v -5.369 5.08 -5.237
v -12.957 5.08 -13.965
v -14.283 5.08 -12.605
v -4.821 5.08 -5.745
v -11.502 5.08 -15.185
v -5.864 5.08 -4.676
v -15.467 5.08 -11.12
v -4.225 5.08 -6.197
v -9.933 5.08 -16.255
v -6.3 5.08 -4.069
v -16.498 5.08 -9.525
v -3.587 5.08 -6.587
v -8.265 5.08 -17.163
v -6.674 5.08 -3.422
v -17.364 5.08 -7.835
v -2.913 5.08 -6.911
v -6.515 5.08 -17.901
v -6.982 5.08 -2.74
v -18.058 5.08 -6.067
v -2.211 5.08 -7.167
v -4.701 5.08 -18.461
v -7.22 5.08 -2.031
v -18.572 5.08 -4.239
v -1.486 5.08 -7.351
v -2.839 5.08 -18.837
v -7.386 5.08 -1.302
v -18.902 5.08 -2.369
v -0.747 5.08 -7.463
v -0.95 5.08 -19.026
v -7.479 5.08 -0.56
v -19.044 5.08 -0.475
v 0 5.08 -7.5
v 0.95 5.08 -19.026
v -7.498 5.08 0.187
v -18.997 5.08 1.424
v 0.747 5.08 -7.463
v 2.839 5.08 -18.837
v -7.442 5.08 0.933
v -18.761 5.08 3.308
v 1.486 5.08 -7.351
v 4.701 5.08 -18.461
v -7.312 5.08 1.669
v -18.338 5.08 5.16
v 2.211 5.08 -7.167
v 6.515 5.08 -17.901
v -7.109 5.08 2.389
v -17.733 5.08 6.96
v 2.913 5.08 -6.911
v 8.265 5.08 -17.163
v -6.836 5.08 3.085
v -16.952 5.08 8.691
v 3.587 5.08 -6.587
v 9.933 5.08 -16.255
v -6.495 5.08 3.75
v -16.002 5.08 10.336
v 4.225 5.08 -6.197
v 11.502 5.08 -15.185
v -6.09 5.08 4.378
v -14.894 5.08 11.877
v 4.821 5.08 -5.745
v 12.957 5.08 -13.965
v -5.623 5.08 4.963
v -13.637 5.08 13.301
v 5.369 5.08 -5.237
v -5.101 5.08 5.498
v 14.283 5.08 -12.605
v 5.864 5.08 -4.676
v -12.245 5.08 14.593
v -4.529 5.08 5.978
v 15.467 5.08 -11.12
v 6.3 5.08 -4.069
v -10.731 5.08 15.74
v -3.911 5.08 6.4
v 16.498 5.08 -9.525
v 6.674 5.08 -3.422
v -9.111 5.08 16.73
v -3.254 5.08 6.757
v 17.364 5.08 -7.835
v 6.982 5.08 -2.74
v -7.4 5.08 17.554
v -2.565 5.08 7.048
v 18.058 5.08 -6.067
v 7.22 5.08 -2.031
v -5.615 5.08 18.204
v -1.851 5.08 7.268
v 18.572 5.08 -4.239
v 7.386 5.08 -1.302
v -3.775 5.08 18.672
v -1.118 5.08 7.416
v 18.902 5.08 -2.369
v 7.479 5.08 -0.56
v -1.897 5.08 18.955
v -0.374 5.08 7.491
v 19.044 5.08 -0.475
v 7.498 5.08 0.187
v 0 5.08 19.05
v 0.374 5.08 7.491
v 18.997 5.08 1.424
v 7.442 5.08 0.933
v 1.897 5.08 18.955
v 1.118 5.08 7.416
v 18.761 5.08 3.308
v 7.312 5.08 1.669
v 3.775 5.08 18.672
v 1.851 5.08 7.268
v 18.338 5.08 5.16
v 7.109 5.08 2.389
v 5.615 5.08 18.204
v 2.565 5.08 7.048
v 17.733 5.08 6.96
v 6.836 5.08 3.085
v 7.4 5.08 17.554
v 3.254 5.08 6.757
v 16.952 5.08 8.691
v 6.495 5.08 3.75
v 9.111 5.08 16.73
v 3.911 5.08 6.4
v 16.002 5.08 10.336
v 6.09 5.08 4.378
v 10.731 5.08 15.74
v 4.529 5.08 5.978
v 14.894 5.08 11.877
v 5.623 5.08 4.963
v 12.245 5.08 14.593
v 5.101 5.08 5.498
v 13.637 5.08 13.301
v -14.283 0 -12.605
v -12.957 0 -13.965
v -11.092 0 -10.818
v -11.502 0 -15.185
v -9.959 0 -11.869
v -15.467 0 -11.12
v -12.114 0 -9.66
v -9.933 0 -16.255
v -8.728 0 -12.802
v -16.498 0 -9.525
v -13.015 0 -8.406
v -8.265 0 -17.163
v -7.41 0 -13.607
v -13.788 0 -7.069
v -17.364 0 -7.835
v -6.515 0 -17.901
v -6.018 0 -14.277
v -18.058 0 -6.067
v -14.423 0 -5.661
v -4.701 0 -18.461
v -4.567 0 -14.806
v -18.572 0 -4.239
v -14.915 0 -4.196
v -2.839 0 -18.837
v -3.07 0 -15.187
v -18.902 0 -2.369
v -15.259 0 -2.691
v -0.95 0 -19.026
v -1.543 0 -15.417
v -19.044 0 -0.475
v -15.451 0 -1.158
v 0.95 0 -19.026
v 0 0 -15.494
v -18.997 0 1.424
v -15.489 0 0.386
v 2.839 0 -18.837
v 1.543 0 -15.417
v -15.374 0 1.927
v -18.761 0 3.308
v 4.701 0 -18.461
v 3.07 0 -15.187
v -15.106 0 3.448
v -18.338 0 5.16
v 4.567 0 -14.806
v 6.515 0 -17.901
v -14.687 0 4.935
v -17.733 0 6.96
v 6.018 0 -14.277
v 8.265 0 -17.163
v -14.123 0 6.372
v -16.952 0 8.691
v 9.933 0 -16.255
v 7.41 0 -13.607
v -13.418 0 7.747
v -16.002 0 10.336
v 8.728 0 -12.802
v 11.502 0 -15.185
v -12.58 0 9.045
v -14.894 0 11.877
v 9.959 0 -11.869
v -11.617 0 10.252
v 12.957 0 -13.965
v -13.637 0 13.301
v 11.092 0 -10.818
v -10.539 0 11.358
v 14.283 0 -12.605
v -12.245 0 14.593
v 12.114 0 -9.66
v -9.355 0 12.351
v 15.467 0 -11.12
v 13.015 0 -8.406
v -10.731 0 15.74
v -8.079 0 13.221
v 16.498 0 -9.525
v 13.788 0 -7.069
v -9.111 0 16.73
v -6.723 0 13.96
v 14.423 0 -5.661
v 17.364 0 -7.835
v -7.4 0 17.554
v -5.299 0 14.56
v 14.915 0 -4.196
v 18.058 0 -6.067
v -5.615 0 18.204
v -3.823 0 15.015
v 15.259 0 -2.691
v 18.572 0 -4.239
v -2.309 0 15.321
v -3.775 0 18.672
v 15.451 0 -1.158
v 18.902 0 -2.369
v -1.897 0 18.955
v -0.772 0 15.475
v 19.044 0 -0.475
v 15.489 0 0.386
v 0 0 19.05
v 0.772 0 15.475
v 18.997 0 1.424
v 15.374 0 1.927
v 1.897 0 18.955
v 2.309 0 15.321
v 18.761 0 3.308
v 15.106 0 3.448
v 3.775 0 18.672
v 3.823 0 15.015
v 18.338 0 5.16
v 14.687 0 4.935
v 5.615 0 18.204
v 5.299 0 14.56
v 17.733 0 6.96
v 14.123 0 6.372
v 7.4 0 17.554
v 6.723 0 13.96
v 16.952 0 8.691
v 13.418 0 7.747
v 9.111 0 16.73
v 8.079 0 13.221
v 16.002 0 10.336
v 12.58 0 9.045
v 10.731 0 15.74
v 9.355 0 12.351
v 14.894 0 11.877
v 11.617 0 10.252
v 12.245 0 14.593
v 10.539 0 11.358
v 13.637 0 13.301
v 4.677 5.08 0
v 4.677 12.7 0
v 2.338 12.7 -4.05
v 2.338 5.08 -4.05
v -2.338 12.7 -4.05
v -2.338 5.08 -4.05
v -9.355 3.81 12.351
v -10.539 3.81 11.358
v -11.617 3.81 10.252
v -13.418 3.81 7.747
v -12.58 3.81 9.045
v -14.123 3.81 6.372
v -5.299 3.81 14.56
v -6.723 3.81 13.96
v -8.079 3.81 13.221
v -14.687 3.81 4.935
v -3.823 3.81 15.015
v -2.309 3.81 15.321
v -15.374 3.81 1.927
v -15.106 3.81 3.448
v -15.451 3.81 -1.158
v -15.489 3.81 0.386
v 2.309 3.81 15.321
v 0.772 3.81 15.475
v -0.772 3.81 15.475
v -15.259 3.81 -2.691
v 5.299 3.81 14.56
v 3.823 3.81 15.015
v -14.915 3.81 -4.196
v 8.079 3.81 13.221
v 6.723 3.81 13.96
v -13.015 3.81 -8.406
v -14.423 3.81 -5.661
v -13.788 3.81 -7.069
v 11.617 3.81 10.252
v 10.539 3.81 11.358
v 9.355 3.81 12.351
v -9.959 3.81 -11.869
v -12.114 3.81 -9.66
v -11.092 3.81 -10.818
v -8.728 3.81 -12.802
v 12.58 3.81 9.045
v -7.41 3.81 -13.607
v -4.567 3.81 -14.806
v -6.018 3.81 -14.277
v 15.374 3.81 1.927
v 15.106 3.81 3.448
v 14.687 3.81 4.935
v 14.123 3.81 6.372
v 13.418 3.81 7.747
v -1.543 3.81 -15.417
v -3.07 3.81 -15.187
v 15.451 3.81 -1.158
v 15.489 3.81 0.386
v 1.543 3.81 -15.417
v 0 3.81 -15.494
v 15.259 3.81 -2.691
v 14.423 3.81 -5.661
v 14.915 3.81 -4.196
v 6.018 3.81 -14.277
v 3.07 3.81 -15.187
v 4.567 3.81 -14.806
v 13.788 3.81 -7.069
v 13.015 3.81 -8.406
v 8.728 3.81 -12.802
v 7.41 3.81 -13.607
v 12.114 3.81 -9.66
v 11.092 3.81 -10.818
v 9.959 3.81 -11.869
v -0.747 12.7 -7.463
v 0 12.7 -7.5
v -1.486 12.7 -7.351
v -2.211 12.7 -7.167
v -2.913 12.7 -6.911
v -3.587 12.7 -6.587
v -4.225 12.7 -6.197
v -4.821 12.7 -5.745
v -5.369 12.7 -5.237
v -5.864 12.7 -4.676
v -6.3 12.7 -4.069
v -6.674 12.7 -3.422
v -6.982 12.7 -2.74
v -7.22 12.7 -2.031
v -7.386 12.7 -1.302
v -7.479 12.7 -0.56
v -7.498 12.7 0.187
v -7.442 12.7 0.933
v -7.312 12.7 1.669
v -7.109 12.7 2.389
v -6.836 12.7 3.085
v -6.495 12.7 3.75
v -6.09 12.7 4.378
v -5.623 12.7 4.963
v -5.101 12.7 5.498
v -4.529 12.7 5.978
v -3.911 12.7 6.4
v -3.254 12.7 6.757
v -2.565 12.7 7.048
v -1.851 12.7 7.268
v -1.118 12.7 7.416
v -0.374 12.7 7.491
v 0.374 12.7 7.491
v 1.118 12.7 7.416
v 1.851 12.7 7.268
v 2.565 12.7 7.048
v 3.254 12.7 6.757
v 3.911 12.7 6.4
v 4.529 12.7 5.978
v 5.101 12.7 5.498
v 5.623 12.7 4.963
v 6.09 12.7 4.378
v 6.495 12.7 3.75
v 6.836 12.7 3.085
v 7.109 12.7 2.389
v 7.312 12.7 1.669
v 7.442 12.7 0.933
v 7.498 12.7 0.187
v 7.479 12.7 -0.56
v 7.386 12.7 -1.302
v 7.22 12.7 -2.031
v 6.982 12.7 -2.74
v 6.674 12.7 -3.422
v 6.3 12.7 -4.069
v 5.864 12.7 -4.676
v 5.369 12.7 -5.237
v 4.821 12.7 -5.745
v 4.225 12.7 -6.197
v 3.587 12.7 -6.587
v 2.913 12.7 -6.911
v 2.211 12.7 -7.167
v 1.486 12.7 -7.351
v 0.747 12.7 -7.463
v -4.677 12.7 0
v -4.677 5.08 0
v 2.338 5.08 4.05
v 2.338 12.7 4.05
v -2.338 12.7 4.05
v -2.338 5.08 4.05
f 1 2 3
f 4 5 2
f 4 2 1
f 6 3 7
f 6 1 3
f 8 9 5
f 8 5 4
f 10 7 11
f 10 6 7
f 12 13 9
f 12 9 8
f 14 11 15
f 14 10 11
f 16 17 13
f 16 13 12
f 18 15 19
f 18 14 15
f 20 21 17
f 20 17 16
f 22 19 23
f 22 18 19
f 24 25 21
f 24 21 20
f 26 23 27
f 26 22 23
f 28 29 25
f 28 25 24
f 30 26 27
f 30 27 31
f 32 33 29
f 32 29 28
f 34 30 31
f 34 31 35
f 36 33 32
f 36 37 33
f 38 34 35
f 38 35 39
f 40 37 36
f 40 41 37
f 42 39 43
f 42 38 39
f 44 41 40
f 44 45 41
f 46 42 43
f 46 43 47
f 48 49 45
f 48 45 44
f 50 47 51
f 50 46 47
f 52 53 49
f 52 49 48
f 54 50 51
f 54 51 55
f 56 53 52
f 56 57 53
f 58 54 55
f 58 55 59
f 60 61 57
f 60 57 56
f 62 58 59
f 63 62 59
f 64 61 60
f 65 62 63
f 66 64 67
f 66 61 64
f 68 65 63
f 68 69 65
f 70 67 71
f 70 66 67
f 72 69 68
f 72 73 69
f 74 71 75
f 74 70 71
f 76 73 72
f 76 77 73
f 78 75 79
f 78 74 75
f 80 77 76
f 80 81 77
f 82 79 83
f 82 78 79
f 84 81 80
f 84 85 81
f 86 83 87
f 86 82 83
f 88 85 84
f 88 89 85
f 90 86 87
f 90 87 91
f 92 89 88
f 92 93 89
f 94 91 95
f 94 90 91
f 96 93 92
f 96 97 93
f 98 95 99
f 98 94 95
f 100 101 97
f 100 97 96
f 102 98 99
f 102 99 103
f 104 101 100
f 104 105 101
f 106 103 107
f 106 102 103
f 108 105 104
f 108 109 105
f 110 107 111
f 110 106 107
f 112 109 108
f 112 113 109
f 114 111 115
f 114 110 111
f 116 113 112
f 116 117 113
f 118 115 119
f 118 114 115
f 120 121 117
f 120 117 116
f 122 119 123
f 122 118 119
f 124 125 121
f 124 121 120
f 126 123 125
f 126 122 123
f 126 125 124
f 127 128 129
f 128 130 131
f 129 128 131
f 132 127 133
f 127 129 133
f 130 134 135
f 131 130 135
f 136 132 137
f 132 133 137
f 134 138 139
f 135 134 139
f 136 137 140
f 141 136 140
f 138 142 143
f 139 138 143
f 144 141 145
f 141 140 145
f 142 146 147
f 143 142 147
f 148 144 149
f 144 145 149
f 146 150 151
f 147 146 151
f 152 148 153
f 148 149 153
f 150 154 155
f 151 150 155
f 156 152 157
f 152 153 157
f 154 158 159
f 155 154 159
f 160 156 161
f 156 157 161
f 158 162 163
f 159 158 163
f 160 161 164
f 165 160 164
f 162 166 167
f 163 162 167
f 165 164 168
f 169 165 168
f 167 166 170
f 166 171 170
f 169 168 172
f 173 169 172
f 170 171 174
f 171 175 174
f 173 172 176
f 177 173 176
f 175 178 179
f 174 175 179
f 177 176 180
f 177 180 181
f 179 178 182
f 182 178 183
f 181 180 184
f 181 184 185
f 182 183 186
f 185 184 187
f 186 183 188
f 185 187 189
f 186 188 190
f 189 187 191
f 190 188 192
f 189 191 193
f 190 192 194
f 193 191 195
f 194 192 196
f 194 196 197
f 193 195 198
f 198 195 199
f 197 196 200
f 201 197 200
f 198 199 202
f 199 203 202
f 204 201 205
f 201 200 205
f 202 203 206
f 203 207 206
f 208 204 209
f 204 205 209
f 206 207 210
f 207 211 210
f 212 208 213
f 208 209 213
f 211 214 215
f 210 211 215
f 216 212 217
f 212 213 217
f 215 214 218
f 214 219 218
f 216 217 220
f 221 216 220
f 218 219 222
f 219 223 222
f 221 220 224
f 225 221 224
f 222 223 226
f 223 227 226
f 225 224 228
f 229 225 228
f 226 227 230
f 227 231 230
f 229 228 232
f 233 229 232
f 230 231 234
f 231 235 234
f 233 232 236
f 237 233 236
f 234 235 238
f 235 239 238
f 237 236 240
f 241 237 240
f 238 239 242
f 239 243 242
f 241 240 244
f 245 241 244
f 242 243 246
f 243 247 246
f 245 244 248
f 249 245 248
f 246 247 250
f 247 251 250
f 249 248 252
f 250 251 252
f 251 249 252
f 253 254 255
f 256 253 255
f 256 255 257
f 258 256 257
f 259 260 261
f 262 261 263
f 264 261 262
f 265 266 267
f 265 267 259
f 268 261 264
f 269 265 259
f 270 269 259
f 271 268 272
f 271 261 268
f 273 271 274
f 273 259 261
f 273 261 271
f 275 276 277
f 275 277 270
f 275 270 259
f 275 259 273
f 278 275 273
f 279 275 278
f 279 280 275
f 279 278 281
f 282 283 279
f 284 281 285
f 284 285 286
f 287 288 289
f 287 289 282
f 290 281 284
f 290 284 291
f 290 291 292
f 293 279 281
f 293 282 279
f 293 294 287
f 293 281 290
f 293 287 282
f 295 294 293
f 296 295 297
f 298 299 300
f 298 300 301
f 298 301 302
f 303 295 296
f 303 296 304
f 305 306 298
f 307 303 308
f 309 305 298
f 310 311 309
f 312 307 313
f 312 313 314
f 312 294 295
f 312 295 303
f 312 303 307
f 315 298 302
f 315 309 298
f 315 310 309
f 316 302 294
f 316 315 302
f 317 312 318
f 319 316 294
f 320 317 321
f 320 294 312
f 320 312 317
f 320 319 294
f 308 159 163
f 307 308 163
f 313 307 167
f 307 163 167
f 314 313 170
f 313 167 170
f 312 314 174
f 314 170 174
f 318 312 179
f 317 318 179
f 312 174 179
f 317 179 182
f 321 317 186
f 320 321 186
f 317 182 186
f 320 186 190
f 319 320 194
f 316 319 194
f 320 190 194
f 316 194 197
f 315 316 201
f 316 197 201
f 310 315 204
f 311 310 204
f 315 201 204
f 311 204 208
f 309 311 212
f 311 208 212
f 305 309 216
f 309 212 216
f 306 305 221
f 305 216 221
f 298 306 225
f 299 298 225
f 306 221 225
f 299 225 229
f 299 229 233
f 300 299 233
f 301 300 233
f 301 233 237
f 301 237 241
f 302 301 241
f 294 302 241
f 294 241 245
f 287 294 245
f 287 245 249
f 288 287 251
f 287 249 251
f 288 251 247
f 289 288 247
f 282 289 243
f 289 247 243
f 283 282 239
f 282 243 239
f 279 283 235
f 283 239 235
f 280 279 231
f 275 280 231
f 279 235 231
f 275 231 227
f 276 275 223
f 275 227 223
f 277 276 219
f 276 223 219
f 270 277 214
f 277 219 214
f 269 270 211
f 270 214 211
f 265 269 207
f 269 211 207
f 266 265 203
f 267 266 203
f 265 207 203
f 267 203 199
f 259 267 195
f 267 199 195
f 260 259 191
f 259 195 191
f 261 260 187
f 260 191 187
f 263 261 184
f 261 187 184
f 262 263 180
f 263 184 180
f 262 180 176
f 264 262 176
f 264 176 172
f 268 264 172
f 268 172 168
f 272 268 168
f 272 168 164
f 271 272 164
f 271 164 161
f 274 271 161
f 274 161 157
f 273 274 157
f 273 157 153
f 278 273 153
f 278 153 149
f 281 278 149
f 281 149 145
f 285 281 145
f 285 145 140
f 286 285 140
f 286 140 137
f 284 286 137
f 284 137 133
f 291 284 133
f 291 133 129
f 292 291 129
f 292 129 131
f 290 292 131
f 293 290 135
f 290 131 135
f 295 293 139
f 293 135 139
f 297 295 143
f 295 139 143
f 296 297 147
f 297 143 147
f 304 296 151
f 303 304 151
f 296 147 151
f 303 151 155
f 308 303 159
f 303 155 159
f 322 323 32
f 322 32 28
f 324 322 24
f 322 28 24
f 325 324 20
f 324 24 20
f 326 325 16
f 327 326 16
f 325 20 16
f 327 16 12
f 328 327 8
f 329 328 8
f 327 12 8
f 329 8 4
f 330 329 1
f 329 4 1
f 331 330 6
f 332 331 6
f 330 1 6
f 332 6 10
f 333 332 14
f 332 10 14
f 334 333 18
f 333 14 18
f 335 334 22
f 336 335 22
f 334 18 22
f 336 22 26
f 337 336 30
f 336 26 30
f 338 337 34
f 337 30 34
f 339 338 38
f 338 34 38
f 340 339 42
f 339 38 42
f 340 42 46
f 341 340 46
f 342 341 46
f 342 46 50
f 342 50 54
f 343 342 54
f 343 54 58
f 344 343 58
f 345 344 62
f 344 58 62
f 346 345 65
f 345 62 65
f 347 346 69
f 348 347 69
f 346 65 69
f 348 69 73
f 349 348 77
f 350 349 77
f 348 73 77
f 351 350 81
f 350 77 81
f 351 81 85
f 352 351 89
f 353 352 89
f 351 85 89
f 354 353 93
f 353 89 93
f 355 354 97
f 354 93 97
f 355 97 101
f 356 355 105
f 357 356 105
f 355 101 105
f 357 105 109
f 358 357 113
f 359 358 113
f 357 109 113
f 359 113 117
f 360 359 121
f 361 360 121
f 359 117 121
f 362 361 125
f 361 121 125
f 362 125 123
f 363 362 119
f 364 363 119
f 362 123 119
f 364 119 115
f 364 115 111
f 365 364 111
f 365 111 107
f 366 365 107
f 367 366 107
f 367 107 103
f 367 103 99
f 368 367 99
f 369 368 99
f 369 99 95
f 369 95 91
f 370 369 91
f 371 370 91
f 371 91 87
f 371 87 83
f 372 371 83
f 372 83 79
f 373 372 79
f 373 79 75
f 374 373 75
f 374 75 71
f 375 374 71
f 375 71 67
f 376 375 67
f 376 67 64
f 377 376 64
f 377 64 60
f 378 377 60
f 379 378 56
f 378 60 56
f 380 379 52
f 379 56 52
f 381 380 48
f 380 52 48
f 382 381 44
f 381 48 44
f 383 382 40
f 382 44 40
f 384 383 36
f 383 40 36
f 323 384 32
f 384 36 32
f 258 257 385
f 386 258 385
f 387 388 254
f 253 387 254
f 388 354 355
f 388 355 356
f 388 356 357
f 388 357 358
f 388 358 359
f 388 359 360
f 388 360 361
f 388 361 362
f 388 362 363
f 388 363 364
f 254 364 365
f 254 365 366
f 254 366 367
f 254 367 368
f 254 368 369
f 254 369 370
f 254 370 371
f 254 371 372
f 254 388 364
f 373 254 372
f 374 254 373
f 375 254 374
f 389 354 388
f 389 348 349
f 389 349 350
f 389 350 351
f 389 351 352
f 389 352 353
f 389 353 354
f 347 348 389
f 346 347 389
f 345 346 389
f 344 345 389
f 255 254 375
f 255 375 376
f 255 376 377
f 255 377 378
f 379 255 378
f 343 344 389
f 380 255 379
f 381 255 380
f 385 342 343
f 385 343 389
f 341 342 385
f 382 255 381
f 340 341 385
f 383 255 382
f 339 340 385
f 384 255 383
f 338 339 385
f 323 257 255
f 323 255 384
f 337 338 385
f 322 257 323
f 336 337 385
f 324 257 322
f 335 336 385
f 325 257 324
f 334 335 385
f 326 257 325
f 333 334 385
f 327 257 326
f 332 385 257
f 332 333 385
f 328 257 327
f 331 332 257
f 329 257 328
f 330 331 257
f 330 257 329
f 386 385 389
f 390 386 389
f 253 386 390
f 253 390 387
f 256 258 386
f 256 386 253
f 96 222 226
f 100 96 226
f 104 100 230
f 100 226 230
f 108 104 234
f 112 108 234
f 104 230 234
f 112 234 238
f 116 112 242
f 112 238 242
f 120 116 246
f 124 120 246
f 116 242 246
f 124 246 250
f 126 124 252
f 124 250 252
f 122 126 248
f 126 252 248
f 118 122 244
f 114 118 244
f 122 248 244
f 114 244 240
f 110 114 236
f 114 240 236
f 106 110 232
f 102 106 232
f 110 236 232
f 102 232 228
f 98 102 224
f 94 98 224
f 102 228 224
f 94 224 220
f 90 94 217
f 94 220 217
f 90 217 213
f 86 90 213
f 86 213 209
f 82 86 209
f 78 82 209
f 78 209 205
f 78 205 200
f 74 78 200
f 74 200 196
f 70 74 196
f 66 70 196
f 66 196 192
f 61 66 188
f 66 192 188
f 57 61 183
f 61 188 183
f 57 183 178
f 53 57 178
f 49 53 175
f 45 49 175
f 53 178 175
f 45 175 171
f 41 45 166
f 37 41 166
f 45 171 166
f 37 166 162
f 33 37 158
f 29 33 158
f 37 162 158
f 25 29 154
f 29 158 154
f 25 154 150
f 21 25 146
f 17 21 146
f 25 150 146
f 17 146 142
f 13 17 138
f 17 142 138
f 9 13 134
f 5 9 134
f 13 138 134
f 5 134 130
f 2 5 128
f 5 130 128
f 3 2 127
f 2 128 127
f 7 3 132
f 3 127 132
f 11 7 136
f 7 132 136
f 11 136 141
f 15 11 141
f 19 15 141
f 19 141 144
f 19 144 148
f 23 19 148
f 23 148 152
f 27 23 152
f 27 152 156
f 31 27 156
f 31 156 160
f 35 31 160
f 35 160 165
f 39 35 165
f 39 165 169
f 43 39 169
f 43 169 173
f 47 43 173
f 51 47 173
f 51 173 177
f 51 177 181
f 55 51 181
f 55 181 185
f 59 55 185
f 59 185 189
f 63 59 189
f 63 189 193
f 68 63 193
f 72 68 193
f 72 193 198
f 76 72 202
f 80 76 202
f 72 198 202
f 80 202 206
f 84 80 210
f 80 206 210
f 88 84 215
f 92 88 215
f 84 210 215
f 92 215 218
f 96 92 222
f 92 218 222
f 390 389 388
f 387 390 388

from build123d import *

# Parameters (mm, degrees)
SKETCH1_R           = 19.05
BOSS_EXTRUDE1_DEPTH = 5.08
SKETCH3_R           = 7.5
BOSS_EXTRUDE2_DEPTH = 7.62
CUT_EXTRUDE1_DEPTH  = 7.62
SKETCH5_R           = 15.494
CUT_EXTRUDE2_DEPTH  = 3.81


with BuildPart() as part:
    # Sketch1 → Boss-Extrude1 (new body)
    with BuildSketch(Plane(origin=(0, 0, 0), x_dir=(1, 0, 0), z_dir=(0, 1, 0))):
        with Locations(Location((0, 0, 0), (0, 0, 270))):
            Circle(SKETCH1_R)
    extrude(amount=BOSS_EXTRUDE1_DEPTH)

    # Sketch3 → Boss-Extrude2 (add)
    with BuildSketch(Plane(origin=(0, 5.08, 0), x_dir=(1, 0, 0), z_dir=(0, 1, 0))):
        with Locations(Location((0, 0, 0), (0, 0, 90))):
            Circle(SKETCH3_R)
    extrude(amount=BOSS_EXTRUDE2_DEPTH)

    # Sketch4 → Cut-Extrude1 (cut)
    with BuildSketch(Plane(origin=(0, 12.7, 0), x_dir=(1, 0, 0), z_dir=(0, 1, 0))):
        Polygon((4.67653718, 0), (2.33826859, 4.05), (-2.33826859, 4.05), (-4.67653718, 0), (-2.33826859, -4.05), (2.33826859, -4.05), align=None)
    extrude(amount=-CUT_EXTRUDE1_DEPTH, mode=Mode.SUBTRACT)

    # Sketch5 → Cut-Extrude2 (cut)
    with BuildSketch(Plane.XZ):
        with Locations(Location((0, 0, 0), (0, 0, 270))):
            Circle(SKETCH5_R)
    extrude(amount=-CUT_EXTRUDE2_DEPTH, mode=Mode.SUBTRACT)


solid = part.part
